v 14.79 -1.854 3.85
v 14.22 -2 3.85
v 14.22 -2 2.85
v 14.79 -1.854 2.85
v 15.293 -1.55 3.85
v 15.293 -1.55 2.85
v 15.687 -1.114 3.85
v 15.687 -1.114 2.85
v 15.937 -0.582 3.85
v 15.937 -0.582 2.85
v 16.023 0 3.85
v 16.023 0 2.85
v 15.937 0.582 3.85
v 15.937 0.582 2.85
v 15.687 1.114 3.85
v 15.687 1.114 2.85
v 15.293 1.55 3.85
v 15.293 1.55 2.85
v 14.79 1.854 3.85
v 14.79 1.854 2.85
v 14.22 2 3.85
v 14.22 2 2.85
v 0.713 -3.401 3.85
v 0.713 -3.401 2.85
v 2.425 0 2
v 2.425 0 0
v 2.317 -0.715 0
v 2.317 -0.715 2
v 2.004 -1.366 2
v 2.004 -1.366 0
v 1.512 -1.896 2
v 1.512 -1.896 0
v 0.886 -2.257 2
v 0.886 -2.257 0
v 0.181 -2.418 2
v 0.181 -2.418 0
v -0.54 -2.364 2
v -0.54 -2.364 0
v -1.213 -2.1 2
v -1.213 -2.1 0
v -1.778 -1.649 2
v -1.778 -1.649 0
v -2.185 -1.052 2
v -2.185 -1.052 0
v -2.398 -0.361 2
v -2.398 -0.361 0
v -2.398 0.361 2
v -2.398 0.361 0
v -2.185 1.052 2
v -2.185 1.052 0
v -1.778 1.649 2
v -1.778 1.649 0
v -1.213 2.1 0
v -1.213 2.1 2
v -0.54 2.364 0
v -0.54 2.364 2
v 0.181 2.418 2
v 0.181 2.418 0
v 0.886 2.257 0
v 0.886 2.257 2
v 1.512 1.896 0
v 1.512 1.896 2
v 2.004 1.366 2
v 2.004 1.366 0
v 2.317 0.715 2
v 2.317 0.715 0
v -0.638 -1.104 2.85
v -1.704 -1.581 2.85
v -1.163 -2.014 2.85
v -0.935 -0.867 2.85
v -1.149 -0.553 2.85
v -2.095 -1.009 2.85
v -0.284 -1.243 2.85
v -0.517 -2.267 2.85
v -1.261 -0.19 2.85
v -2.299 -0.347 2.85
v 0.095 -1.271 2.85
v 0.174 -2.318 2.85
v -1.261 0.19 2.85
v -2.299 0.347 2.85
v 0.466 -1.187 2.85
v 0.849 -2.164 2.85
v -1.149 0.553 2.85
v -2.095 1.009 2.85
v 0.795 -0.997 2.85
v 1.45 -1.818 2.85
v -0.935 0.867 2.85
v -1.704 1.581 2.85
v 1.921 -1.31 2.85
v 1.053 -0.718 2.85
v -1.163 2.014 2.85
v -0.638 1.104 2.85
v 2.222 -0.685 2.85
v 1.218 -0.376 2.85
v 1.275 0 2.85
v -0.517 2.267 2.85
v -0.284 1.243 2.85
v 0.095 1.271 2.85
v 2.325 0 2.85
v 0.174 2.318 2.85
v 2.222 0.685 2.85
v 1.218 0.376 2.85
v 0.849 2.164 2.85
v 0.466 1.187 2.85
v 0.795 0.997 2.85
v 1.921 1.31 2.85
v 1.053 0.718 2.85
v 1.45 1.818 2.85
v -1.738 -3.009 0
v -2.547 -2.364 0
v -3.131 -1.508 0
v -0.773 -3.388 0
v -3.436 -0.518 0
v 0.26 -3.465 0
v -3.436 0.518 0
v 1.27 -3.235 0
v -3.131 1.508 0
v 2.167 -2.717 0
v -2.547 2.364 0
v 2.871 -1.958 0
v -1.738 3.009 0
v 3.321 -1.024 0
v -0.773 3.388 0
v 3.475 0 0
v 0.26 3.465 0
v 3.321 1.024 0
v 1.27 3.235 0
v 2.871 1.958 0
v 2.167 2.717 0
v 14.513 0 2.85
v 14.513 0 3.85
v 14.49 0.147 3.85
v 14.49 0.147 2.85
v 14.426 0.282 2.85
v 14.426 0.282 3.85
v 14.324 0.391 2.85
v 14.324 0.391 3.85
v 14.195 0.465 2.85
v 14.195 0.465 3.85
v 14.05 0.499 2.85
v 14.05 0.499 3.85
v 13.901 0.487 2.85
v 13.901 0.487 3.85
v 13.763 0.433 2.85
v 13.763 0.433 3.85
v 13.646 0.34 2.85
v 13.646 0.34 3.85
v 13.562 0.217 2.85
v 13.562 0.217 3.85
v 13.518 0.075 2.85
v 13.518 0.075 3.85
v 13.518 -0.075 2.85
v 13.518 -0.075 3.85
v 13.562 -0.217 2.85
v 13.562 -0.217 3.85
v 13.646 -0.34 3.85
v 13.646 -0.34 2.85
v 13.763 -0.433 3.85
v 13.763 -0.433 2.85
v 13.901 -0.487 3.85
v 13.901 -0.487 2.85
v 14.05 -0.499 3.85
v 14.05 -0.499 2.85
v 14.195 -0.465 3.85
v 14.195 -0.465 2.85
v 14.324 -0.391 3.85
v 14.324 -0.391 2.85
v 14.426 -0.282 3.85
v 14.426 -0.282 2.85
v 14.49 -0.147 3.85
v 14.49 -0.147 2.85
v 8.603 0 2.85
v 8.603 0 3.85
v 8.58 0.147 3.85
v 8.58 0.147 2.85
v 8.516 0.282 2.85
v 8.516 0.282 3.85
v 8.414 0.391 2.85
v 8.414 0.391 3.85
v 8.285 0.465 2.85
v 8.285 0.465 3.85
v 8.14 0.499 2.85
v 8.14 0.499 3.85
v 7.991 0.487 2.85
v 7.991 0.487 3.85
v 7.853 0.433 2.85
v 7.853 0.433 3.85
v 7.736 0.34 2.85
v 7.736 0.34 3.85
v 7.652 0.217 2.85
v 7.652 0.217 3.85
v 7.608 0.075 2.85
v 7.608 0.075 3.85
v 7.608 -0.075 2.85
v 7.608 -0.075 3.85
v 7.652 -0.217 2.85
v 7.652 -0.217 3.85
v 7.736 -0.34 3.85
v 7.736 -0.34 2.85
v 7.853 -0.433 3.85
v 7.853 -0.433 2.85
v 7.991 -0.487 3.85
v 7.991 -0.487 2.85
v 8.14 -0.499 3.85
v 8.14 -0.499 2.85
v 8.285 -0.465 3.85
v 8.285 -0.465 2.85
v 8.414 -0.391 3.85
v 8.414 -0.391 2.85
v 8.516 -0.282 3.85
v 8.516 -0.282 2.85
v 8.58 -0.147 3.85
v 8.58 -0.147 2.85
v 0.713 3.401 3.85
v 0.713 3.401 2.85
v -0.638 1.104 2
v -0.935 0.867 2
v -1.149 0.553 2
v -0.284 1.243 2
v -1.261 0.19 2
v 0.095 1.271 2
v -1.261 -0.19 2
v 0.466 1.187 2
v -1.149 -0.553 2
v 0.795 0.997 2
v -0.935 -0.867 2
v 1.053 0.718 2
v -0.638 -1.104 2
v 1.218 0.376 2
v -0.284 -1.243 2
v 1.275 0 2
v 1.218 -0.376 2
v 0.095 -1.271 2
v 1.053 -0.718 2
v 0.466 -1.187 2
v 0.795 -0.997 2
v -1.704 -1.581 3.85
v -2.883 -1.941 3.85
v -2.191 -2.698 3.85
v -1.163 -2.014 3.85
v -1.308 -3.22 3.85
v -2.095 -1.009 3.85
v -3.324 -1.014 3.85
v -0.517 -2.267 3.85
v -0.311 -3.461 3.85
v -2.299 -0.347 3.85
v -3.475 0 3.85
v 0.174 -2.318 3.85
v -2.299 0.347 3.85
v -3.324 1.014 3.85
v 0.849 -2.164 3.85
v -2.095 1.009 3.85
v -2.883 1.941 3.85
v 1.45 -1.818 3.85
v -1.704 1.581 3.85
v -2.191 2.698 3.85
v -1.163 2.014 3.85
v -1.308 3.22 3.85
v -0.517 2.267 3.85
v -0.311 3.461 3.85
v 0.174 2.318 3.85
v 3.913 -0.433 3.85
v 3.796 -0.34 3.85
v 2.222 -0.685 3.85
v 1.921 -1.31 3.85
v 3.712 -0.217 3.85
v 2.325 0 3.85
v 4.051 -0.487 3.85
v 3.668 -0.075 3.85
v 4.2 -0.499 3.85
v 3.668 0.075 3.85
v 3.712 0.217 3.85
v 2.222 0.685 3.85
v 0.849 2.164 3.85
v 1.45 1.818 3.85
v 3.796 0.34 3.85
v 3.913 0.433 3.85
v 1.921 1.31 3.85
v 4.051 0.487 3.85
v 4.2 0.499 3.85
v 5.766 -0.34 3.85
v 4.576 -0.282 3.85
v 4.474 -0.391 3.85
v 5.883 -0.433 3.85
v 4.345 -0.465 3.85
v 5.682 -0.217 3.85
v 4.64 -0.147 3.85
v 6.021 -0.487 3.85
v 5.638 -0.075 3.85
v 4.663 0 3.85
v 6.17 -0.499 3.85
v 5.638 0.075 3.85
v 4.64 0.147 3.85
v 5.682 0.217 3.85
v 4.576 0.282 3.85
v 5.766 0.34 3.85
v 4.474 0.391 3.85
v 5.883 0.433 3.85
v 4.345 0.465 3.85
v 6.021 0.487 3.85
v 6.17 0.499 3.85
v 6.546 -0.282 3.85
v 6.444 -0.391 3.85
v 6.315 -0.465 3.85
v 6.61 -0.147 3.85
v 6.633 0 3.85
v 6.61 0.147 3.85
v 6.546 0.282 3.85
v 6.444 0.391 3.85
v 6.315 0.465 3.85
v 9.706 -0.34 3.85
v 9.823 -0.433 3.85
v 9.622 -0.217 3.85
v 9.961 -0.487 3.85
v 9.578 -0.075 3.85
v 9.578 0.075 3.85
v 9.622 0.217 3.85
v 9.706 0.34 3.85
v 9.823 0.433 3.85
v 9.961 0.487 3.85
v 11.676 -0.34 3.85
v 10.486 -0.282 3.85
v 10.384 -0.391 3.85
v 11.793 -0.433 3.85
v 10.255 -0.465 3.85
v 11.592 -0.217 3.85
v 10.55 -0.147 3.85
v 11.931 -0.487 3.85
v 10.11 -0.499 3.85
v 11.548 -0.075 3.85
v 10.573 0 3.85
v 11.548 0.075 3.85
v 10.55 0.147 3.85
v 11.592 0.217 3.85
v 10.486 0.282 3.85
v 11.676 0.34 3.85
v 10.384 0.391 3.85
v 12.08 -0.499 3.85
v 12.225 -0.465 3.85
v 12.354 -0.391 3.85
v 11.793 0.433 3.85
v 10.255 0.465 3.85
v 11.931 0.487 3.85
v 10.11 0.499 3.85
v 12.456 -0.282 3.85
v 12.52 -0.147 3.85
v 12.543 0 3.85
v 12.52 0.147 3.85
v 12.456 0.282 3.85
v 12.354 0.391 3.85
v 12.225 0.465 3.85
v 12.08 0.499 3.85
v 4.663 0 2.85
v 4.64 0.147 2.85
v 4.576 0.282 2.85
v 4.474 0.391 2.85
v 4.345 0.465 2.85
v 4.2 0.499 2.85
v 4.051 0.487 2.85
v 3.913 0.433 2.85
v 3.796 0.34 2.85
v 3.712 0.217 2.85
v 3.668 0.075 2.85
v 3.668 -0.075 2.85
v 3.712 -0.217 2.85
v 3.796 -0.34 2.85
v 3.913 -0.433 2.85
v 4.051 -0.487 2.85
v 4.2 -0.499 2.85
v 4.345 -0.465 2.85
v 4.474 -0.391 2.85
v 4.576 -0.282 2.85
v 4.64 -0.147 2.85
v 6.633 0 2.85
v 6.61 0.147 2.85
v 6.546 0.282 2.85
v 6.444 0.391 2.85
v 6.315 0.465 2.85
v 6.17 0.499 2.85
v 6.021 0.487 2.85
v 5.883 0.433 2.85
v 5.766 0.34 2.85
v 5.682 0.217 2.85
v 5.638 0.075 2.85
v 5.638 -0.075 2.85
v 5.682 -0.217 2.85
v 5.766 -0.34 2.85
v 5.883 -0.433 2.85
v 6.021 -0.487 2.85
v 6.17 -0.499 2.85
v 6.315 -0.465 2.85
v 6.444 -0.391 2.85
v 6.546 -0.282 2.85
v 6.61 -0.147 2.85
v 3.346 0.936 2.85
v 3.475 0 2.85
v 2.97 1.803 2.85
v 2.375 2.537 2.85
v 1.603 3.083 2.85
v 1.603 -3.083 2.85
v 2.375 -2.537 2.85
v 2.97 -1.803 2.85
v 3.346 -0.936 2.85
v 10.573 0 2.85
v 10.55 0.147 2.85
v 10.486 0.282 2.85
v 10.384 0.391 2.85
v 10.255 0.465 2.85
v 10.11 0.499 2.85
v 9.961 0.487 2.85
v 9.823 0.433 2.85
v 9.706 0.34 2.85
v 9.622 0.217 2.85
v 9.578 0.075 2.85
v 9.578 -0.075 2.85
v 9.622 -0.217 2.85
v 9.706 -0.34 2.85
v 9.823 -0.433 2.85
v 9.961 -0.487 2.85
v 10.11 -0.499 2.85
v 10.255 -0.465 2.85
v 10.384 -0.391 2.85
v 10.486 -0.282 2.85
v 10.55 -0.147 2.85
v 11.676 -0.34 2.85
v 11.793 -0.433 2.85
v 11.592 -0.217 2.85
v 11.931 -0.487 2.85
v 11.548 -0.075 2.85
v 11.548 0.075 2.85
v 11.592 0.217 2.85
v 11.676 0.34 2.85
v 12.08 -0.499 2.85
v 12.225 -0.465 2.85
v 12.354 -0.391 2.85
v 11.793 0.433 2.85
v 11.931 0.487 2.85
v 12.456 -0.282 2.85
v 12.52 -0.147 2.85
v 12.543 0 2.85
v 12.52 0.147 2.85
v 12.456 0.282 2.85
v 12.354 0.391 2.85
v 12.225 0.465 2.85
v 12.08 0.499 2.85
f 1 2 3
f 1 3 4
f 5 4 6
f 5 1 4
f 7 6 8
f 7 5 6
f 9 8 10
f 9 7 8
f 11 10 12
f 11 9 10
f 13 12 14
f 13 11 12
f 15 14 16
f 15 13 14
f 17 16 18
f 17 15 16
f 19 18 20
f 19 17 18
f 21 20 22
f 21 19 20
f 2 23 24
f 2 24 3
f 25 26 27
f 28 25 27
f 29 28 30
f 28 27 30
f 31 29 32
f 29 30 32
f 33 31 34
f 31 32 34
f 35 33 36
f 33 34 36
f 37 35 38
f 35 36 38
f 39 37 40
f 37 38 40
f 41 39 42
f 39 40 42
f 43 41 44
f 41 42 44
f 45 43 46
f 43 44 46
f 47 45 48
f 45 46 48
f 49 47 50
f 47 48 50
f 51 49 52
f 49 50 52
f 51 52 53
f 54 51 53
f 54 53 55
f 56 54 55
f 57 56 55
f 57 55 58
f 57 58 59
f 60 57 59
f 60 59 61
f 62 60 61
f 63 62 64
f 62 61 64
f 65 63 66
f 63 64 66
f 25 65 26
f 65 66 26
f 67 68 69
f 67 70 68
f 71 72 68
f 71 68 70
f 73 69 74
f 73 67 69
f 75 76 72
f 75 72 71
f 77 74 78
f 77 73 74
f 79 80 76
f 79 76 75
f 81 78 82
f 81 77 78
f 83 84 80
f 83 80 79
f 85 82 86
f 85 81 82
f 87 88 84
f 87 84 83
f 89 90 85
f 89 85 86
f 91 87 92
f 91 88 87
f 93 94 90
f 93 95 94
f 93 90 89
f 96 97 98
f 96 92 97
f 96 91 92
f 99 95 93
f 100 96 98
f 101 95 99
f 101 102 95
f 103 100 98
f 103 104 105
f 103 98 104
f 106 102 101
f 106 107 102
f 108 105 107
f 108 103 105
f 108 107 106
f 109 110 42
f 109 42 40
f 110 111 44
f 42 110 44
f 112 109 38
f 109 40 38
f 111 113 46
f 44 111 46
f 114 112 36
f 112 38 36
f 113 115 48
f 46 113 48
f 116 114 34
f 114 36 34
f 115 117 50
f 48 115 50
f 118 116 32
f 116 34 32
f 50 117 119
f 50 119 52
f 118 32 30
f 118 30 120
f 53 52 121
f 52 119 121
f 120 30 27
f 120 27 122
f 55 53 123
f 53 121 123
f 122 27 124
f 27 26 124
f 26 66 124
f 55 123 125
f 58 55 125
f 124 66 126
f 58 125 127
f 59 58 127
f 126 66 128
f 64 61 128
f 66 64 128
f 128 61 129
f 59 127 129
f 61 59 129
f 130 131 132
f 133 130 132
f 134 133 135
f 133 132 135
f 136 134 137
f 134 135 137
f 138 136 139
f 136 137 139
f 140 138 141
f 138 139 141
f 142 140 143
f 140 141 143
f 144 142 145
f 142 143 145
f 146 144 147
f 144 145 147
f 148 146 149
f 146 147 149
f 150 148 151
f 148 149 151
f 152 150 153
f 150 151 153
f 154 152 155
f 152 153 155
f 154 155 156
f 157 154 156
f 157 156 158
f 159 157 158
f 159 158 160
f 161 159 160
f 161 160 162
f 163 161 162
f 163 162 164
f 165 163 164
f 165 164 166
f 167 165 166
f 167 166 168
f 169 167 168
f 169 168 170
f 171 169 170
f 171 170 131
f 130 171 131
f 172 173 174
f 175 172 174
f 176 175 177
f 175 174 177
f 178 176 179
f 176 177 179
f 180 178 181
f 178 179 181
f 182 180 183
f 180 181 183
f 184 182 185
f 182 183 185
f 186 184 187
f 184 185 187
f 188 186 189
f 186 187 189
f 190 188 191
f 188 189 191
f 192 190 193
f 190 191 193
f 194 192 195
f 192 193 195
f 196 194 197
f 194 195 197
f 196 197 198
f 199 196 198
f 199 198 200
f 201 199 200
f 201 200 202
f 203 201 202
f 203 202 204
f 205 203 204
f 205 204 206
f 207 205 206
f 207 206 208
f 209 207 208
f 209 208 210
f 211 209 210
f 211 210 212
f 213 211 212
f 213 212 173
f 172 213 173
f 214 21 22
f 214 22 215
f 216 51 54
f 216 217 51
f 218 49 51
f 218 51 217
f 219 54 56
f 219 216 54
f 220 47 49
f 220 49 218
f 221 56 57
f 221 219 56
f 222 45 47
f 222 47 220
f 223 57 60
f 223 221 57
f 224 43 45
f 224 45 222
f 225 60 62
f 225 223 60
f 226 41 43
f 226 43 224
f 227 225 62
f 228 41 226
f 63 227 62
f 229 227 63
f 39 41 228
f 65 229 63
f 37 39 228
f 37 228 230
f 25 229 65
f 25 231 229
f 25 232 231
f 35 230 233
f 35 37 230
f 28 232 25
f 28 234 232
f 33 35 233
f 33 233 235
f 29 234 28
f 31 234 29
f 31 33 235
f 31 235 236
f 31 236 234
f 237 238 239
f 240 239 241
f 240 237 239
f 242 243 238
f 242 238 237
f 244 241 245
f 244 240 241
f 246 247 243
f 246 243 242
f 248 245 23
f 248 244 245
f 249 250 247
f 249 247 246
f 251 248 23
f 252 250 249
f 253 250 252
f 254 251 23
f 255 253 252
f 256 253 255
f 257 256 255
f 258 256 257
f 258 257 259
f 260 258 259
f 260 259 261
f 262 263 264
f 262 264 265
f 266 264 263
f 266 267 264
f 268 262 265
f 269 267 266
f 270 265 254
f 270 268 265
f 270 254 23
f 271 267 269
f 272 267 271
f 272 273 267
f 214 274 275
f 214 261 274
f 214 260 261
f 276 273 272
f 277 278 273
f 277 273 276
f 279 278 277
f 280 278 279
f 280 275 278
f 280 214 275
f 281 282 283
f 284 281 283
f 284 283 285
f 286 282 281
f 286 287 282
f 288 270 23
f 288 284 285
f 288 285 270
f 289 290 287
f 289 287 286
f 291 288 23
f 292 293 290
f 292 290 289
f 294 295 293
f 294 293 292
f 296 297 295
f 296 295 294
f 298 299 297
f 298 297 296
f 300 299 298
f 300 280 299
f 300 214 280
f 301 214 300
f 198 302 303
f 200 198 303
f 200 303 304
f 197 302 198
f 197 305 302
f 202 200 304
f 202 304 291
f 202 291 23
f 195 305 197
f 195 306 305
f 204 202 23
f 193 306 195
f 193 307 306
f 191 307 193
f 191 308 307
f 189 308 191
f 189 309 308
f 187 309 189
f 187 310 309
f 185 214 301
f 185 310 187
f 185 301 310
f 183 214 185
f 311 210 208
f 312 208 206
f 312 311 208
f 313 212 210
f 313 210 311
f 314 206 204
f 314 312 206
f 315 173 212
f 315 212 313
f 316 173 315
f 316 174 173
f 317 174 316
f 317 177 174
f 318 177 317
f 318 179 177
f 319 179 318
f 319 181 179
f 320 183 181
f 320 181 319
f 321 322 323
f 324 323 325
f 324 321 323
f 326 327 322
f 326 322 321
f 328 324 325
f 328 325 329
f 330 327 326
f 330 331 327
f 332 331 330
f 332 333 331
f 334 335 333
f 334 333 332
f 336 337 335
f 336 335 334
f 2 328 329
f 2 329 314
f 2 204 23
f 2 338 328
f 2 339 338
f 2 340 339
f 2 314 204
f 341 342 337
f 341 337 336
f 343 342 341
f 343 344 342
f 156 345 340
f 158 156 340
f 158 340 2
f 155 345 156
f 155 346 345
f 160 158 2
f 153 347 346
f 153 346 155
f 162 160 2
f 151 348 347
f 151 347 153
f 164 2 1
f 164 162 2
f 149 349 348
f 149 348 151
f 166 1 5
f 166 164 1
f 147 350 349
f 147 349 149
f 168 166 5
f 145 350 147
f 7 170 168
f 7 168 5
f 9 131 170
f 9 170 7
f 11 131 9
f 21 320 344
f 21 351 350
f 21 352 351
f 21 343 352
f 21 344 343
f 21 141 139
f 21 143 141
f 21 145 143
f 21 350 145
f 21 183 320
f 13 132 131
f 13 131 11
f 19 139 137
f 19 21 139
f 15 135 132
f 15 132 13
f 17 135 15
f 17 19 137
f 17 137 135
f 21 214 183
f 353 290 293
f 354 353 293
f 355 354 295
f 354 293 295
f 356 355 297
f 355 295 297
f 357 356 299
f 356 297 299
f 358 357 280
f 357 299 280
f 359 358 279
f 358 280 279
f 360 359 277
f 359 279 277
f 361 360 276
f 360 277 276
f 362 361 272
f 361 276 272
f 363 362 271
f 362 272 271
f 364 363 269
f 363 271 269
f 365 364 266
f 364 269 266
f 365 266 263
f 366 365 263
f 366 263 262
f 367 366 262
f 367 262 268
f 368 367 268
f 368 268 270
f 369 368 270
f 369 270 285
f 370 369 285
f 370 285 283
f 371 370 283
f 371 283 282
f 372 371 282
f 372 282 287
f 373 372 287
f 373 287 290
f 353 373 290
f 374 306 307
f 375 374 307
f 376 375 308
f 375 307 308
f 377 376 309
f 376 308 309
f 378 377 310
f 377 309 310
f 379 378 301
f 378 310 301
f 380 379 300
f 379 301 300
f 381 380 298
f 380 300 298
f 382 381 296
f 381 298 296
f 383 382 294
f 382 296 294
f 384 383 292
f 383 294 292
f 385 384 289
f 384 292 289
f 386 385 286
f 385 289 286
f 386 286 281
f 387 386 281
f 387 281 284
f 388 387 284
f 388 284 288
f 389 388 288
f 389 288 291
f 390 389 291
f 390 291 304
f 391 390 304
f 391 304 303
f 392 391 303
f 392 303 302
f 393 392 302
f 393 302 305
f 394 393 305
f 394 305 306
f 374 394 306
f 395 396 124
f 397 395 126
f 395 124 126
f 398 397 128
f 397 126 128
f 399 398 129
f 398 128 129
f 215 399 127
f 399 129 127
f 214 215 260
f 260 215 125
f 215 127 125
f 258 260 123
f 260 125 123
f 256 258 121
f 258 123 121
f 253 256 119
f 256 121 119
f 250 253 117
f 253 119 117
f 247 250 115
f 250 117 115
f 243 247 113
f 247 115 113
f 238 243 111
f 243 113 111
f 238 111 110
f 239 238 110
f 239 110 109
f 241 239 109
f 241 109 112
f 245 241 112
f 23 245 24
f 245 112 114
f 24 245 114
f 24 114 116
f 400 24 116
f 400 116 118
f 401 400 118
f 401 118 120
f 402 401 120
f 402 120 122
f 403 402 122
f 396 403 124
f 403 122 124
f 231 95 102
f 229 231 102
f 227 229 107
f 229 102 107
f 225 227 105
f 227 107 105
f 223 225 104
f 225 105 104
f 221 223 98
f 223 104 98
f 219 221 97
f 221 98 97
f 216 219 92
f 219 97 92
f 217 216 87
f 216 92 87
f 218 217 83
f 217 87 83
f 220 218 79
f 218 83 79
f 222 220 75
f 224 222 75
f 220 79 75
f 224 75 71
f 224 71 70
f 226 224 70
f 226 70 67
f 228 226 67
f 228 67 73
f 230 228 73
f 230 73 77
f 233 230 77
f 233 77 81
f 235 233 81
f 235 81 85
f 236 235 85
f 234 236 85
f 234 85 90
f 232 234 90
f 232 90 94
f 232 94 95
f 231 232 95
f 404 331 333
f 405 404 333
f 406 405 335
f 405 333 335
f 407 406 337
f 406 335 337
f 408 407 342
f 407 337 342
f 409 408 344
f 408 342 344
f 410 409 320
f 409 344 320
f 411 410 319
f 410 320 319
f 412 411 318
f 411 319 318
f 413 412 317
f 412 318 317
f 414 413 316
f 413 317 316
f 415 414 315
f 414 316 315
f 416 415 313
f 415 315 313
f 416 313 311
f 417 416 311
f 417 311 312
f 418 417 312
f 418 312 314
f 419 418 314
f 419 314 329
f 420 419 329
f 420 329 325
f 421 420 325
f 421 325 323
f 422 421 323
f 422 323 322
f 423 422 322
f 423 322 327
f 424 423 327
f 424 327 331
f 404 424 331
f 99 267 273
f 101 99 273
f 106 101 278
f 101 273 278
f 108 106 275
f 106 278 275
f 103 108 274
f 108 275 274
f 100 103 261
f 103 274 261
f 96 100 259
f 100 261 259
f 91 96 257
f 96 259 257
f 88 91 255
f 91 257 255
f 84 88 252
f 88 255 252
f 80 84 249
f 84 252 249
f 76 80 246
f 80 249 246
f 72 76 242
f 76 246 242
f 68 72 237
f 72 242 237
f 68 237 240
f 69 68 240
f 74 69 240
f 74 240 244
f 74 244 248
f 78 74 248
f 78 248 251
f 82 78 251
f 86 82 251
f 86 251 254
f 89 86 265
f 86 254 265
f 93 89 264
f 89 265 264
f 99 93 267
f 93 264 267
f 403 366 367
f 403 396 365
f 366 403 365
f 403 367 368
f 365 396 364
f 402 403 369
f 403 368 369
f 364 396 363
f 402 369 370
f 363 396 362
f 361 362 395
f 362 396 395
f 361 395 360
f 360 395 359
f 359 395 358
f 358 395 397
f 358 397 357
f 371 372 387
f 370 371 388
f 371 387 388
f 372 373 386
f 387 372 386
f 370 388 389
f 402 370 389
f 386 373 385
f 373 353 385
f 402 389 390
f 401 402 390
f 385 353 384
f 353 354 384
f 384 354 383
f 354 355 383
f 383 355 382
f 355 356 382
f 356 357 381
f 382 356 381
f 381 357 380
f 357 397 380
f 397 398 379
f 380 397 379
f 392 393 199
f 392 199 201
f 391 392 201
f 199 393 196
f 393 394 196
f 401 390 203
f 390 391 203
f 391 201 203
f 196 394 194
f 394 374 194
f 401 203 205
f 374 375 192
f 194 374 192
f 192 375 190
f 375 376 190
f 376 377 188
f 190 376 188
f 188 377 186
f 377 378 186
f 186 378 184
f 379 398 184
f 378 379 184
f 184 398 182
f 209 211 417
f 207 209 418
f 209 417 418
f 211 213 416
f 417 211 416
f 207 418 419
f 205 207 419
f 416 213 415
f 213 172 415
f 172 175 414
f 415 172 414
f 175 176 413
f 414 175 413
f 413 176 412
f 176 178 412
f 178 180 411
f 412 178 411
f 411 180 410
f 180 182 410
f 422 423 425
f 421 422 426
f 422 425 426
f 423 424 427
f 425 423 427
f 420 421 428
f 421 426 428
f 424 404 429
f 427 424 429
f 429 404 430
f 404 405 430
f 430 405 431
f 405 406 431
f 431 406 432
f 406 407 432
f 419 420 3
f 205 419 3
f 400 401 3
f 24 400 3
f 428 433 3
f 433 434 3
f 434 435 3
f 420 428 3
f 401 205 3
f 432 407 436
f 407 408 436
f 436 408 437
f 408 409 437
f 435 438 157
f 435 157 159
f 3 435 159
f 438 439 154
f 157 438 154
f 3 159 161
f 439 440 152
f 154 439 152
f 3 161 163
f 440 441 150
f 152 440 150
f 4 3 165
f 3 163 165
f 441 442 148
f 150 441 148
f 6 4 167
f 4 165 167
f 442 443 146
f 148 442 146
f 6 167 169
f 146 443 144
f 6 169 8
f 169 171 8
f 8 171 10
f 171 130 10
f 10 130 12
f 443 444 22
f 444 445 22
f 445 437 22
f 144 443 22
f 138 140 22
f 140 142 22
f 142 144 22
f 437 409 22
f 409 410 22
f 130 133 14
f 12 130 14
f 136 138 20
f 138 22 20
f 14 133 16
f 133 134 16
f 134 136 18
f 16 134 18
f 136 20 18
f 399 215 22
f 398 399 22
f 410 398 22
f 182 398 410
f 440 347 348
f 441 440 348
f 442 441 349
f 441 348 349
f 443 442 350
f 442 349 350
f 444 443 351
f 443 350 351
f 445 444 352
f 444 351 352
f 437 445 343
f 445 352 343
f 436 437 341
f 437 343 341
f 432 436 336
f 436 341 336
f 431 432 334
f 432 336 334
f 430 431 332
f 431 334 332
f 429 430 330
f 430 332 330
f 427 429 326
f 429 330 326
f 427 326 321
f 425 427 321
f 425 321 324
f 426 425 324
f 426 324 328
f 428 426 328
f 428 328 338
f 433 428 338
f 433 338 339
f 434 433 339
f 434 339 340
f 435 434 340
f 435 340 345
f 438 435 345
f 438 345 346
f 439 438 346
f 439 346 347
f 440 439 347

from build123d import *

# Parameters (mm, degrees)
F0_R      = 3.475
F1_DEPTH  = 3.85
F2_R      = 2.425
F3_DEPTH  = 2
F5_DEPTH  = 1
F6_R      = 2.325
F7_DEPTH  = 1
F8_R      = 1.275
F9_DEPTH  = 2.851
F10_R     = 0.5
F11_DEPTH = 3.851


with BuildPart() as f1:
    # F0 (on Top) → F1 (new body)
    with BuildSketch(Plane.XY):
        Circle(F0_R)
    extrude(amount=F1_DEPTH)

    # F2 (on face) → F3 (cut)
    with BuildSketch(Plane(origin=(0, 0, 0), x_dir=(1, 0, 0), z_dir=(0, 0, -1))):
        Circle(F2_R)
    extrude(amount=-F3_DEPTH, mode=Mode.SUBTRACT)

    # F4 (on face) → F5 (join)
    with BuildSketch(Plane.XY.offset(3.85)):
        with BuildLine():
            Line((14.22, 2), (0, 3.475))
            ThreePointArc((0, 3.475), (-3.475, 0), (0, -3.475))
            Line((0, -3.475), (14.22, -2))
            ThreePointArc((14.22, -2), (16.023276, 0), (14.22, 2))
        make_face()
    extrude(amount=-F5_DEPTH)

    # F6 (on face) → F7 (cut)
    with BuildSketch(Plane.XY.offset(3.85)):
        Circle(F6_R)
    extrude(amount=-F7_DEPTH, mode=Mode.SUBTRACT)

    # F8 (on face) → F9 (cut, through all)
    with BuildSketch(Plane.XY.offset(2.85)):
        Circle(F8_R)
    extrude(amount=-F9_DEPTH, mode=Mode.SUBTRACT)

    # F10 (on face) → F11 (cut, through all)
    with BuildSketch(Plane.XY.offset(3.85)):
        with Locations((14.012546, 0)):
            Circle(F10_R)
        with Locations((12.042546, 0)):
            Circle(F10_R)
        with Locations((10.072546, 0)):
            Circle(F10_R)
        with Locations((8.102546, 0)):
            Circle(F10_R)
        with Locations((6.132546, 0)):
            Circle(F10_R)
        with Locations((4.162546, 0)):
            Circle(F10_R)
    extrude(amount=-F11_DEPTH, mode=Mode.SUBTRACT)


solid = f1.part
